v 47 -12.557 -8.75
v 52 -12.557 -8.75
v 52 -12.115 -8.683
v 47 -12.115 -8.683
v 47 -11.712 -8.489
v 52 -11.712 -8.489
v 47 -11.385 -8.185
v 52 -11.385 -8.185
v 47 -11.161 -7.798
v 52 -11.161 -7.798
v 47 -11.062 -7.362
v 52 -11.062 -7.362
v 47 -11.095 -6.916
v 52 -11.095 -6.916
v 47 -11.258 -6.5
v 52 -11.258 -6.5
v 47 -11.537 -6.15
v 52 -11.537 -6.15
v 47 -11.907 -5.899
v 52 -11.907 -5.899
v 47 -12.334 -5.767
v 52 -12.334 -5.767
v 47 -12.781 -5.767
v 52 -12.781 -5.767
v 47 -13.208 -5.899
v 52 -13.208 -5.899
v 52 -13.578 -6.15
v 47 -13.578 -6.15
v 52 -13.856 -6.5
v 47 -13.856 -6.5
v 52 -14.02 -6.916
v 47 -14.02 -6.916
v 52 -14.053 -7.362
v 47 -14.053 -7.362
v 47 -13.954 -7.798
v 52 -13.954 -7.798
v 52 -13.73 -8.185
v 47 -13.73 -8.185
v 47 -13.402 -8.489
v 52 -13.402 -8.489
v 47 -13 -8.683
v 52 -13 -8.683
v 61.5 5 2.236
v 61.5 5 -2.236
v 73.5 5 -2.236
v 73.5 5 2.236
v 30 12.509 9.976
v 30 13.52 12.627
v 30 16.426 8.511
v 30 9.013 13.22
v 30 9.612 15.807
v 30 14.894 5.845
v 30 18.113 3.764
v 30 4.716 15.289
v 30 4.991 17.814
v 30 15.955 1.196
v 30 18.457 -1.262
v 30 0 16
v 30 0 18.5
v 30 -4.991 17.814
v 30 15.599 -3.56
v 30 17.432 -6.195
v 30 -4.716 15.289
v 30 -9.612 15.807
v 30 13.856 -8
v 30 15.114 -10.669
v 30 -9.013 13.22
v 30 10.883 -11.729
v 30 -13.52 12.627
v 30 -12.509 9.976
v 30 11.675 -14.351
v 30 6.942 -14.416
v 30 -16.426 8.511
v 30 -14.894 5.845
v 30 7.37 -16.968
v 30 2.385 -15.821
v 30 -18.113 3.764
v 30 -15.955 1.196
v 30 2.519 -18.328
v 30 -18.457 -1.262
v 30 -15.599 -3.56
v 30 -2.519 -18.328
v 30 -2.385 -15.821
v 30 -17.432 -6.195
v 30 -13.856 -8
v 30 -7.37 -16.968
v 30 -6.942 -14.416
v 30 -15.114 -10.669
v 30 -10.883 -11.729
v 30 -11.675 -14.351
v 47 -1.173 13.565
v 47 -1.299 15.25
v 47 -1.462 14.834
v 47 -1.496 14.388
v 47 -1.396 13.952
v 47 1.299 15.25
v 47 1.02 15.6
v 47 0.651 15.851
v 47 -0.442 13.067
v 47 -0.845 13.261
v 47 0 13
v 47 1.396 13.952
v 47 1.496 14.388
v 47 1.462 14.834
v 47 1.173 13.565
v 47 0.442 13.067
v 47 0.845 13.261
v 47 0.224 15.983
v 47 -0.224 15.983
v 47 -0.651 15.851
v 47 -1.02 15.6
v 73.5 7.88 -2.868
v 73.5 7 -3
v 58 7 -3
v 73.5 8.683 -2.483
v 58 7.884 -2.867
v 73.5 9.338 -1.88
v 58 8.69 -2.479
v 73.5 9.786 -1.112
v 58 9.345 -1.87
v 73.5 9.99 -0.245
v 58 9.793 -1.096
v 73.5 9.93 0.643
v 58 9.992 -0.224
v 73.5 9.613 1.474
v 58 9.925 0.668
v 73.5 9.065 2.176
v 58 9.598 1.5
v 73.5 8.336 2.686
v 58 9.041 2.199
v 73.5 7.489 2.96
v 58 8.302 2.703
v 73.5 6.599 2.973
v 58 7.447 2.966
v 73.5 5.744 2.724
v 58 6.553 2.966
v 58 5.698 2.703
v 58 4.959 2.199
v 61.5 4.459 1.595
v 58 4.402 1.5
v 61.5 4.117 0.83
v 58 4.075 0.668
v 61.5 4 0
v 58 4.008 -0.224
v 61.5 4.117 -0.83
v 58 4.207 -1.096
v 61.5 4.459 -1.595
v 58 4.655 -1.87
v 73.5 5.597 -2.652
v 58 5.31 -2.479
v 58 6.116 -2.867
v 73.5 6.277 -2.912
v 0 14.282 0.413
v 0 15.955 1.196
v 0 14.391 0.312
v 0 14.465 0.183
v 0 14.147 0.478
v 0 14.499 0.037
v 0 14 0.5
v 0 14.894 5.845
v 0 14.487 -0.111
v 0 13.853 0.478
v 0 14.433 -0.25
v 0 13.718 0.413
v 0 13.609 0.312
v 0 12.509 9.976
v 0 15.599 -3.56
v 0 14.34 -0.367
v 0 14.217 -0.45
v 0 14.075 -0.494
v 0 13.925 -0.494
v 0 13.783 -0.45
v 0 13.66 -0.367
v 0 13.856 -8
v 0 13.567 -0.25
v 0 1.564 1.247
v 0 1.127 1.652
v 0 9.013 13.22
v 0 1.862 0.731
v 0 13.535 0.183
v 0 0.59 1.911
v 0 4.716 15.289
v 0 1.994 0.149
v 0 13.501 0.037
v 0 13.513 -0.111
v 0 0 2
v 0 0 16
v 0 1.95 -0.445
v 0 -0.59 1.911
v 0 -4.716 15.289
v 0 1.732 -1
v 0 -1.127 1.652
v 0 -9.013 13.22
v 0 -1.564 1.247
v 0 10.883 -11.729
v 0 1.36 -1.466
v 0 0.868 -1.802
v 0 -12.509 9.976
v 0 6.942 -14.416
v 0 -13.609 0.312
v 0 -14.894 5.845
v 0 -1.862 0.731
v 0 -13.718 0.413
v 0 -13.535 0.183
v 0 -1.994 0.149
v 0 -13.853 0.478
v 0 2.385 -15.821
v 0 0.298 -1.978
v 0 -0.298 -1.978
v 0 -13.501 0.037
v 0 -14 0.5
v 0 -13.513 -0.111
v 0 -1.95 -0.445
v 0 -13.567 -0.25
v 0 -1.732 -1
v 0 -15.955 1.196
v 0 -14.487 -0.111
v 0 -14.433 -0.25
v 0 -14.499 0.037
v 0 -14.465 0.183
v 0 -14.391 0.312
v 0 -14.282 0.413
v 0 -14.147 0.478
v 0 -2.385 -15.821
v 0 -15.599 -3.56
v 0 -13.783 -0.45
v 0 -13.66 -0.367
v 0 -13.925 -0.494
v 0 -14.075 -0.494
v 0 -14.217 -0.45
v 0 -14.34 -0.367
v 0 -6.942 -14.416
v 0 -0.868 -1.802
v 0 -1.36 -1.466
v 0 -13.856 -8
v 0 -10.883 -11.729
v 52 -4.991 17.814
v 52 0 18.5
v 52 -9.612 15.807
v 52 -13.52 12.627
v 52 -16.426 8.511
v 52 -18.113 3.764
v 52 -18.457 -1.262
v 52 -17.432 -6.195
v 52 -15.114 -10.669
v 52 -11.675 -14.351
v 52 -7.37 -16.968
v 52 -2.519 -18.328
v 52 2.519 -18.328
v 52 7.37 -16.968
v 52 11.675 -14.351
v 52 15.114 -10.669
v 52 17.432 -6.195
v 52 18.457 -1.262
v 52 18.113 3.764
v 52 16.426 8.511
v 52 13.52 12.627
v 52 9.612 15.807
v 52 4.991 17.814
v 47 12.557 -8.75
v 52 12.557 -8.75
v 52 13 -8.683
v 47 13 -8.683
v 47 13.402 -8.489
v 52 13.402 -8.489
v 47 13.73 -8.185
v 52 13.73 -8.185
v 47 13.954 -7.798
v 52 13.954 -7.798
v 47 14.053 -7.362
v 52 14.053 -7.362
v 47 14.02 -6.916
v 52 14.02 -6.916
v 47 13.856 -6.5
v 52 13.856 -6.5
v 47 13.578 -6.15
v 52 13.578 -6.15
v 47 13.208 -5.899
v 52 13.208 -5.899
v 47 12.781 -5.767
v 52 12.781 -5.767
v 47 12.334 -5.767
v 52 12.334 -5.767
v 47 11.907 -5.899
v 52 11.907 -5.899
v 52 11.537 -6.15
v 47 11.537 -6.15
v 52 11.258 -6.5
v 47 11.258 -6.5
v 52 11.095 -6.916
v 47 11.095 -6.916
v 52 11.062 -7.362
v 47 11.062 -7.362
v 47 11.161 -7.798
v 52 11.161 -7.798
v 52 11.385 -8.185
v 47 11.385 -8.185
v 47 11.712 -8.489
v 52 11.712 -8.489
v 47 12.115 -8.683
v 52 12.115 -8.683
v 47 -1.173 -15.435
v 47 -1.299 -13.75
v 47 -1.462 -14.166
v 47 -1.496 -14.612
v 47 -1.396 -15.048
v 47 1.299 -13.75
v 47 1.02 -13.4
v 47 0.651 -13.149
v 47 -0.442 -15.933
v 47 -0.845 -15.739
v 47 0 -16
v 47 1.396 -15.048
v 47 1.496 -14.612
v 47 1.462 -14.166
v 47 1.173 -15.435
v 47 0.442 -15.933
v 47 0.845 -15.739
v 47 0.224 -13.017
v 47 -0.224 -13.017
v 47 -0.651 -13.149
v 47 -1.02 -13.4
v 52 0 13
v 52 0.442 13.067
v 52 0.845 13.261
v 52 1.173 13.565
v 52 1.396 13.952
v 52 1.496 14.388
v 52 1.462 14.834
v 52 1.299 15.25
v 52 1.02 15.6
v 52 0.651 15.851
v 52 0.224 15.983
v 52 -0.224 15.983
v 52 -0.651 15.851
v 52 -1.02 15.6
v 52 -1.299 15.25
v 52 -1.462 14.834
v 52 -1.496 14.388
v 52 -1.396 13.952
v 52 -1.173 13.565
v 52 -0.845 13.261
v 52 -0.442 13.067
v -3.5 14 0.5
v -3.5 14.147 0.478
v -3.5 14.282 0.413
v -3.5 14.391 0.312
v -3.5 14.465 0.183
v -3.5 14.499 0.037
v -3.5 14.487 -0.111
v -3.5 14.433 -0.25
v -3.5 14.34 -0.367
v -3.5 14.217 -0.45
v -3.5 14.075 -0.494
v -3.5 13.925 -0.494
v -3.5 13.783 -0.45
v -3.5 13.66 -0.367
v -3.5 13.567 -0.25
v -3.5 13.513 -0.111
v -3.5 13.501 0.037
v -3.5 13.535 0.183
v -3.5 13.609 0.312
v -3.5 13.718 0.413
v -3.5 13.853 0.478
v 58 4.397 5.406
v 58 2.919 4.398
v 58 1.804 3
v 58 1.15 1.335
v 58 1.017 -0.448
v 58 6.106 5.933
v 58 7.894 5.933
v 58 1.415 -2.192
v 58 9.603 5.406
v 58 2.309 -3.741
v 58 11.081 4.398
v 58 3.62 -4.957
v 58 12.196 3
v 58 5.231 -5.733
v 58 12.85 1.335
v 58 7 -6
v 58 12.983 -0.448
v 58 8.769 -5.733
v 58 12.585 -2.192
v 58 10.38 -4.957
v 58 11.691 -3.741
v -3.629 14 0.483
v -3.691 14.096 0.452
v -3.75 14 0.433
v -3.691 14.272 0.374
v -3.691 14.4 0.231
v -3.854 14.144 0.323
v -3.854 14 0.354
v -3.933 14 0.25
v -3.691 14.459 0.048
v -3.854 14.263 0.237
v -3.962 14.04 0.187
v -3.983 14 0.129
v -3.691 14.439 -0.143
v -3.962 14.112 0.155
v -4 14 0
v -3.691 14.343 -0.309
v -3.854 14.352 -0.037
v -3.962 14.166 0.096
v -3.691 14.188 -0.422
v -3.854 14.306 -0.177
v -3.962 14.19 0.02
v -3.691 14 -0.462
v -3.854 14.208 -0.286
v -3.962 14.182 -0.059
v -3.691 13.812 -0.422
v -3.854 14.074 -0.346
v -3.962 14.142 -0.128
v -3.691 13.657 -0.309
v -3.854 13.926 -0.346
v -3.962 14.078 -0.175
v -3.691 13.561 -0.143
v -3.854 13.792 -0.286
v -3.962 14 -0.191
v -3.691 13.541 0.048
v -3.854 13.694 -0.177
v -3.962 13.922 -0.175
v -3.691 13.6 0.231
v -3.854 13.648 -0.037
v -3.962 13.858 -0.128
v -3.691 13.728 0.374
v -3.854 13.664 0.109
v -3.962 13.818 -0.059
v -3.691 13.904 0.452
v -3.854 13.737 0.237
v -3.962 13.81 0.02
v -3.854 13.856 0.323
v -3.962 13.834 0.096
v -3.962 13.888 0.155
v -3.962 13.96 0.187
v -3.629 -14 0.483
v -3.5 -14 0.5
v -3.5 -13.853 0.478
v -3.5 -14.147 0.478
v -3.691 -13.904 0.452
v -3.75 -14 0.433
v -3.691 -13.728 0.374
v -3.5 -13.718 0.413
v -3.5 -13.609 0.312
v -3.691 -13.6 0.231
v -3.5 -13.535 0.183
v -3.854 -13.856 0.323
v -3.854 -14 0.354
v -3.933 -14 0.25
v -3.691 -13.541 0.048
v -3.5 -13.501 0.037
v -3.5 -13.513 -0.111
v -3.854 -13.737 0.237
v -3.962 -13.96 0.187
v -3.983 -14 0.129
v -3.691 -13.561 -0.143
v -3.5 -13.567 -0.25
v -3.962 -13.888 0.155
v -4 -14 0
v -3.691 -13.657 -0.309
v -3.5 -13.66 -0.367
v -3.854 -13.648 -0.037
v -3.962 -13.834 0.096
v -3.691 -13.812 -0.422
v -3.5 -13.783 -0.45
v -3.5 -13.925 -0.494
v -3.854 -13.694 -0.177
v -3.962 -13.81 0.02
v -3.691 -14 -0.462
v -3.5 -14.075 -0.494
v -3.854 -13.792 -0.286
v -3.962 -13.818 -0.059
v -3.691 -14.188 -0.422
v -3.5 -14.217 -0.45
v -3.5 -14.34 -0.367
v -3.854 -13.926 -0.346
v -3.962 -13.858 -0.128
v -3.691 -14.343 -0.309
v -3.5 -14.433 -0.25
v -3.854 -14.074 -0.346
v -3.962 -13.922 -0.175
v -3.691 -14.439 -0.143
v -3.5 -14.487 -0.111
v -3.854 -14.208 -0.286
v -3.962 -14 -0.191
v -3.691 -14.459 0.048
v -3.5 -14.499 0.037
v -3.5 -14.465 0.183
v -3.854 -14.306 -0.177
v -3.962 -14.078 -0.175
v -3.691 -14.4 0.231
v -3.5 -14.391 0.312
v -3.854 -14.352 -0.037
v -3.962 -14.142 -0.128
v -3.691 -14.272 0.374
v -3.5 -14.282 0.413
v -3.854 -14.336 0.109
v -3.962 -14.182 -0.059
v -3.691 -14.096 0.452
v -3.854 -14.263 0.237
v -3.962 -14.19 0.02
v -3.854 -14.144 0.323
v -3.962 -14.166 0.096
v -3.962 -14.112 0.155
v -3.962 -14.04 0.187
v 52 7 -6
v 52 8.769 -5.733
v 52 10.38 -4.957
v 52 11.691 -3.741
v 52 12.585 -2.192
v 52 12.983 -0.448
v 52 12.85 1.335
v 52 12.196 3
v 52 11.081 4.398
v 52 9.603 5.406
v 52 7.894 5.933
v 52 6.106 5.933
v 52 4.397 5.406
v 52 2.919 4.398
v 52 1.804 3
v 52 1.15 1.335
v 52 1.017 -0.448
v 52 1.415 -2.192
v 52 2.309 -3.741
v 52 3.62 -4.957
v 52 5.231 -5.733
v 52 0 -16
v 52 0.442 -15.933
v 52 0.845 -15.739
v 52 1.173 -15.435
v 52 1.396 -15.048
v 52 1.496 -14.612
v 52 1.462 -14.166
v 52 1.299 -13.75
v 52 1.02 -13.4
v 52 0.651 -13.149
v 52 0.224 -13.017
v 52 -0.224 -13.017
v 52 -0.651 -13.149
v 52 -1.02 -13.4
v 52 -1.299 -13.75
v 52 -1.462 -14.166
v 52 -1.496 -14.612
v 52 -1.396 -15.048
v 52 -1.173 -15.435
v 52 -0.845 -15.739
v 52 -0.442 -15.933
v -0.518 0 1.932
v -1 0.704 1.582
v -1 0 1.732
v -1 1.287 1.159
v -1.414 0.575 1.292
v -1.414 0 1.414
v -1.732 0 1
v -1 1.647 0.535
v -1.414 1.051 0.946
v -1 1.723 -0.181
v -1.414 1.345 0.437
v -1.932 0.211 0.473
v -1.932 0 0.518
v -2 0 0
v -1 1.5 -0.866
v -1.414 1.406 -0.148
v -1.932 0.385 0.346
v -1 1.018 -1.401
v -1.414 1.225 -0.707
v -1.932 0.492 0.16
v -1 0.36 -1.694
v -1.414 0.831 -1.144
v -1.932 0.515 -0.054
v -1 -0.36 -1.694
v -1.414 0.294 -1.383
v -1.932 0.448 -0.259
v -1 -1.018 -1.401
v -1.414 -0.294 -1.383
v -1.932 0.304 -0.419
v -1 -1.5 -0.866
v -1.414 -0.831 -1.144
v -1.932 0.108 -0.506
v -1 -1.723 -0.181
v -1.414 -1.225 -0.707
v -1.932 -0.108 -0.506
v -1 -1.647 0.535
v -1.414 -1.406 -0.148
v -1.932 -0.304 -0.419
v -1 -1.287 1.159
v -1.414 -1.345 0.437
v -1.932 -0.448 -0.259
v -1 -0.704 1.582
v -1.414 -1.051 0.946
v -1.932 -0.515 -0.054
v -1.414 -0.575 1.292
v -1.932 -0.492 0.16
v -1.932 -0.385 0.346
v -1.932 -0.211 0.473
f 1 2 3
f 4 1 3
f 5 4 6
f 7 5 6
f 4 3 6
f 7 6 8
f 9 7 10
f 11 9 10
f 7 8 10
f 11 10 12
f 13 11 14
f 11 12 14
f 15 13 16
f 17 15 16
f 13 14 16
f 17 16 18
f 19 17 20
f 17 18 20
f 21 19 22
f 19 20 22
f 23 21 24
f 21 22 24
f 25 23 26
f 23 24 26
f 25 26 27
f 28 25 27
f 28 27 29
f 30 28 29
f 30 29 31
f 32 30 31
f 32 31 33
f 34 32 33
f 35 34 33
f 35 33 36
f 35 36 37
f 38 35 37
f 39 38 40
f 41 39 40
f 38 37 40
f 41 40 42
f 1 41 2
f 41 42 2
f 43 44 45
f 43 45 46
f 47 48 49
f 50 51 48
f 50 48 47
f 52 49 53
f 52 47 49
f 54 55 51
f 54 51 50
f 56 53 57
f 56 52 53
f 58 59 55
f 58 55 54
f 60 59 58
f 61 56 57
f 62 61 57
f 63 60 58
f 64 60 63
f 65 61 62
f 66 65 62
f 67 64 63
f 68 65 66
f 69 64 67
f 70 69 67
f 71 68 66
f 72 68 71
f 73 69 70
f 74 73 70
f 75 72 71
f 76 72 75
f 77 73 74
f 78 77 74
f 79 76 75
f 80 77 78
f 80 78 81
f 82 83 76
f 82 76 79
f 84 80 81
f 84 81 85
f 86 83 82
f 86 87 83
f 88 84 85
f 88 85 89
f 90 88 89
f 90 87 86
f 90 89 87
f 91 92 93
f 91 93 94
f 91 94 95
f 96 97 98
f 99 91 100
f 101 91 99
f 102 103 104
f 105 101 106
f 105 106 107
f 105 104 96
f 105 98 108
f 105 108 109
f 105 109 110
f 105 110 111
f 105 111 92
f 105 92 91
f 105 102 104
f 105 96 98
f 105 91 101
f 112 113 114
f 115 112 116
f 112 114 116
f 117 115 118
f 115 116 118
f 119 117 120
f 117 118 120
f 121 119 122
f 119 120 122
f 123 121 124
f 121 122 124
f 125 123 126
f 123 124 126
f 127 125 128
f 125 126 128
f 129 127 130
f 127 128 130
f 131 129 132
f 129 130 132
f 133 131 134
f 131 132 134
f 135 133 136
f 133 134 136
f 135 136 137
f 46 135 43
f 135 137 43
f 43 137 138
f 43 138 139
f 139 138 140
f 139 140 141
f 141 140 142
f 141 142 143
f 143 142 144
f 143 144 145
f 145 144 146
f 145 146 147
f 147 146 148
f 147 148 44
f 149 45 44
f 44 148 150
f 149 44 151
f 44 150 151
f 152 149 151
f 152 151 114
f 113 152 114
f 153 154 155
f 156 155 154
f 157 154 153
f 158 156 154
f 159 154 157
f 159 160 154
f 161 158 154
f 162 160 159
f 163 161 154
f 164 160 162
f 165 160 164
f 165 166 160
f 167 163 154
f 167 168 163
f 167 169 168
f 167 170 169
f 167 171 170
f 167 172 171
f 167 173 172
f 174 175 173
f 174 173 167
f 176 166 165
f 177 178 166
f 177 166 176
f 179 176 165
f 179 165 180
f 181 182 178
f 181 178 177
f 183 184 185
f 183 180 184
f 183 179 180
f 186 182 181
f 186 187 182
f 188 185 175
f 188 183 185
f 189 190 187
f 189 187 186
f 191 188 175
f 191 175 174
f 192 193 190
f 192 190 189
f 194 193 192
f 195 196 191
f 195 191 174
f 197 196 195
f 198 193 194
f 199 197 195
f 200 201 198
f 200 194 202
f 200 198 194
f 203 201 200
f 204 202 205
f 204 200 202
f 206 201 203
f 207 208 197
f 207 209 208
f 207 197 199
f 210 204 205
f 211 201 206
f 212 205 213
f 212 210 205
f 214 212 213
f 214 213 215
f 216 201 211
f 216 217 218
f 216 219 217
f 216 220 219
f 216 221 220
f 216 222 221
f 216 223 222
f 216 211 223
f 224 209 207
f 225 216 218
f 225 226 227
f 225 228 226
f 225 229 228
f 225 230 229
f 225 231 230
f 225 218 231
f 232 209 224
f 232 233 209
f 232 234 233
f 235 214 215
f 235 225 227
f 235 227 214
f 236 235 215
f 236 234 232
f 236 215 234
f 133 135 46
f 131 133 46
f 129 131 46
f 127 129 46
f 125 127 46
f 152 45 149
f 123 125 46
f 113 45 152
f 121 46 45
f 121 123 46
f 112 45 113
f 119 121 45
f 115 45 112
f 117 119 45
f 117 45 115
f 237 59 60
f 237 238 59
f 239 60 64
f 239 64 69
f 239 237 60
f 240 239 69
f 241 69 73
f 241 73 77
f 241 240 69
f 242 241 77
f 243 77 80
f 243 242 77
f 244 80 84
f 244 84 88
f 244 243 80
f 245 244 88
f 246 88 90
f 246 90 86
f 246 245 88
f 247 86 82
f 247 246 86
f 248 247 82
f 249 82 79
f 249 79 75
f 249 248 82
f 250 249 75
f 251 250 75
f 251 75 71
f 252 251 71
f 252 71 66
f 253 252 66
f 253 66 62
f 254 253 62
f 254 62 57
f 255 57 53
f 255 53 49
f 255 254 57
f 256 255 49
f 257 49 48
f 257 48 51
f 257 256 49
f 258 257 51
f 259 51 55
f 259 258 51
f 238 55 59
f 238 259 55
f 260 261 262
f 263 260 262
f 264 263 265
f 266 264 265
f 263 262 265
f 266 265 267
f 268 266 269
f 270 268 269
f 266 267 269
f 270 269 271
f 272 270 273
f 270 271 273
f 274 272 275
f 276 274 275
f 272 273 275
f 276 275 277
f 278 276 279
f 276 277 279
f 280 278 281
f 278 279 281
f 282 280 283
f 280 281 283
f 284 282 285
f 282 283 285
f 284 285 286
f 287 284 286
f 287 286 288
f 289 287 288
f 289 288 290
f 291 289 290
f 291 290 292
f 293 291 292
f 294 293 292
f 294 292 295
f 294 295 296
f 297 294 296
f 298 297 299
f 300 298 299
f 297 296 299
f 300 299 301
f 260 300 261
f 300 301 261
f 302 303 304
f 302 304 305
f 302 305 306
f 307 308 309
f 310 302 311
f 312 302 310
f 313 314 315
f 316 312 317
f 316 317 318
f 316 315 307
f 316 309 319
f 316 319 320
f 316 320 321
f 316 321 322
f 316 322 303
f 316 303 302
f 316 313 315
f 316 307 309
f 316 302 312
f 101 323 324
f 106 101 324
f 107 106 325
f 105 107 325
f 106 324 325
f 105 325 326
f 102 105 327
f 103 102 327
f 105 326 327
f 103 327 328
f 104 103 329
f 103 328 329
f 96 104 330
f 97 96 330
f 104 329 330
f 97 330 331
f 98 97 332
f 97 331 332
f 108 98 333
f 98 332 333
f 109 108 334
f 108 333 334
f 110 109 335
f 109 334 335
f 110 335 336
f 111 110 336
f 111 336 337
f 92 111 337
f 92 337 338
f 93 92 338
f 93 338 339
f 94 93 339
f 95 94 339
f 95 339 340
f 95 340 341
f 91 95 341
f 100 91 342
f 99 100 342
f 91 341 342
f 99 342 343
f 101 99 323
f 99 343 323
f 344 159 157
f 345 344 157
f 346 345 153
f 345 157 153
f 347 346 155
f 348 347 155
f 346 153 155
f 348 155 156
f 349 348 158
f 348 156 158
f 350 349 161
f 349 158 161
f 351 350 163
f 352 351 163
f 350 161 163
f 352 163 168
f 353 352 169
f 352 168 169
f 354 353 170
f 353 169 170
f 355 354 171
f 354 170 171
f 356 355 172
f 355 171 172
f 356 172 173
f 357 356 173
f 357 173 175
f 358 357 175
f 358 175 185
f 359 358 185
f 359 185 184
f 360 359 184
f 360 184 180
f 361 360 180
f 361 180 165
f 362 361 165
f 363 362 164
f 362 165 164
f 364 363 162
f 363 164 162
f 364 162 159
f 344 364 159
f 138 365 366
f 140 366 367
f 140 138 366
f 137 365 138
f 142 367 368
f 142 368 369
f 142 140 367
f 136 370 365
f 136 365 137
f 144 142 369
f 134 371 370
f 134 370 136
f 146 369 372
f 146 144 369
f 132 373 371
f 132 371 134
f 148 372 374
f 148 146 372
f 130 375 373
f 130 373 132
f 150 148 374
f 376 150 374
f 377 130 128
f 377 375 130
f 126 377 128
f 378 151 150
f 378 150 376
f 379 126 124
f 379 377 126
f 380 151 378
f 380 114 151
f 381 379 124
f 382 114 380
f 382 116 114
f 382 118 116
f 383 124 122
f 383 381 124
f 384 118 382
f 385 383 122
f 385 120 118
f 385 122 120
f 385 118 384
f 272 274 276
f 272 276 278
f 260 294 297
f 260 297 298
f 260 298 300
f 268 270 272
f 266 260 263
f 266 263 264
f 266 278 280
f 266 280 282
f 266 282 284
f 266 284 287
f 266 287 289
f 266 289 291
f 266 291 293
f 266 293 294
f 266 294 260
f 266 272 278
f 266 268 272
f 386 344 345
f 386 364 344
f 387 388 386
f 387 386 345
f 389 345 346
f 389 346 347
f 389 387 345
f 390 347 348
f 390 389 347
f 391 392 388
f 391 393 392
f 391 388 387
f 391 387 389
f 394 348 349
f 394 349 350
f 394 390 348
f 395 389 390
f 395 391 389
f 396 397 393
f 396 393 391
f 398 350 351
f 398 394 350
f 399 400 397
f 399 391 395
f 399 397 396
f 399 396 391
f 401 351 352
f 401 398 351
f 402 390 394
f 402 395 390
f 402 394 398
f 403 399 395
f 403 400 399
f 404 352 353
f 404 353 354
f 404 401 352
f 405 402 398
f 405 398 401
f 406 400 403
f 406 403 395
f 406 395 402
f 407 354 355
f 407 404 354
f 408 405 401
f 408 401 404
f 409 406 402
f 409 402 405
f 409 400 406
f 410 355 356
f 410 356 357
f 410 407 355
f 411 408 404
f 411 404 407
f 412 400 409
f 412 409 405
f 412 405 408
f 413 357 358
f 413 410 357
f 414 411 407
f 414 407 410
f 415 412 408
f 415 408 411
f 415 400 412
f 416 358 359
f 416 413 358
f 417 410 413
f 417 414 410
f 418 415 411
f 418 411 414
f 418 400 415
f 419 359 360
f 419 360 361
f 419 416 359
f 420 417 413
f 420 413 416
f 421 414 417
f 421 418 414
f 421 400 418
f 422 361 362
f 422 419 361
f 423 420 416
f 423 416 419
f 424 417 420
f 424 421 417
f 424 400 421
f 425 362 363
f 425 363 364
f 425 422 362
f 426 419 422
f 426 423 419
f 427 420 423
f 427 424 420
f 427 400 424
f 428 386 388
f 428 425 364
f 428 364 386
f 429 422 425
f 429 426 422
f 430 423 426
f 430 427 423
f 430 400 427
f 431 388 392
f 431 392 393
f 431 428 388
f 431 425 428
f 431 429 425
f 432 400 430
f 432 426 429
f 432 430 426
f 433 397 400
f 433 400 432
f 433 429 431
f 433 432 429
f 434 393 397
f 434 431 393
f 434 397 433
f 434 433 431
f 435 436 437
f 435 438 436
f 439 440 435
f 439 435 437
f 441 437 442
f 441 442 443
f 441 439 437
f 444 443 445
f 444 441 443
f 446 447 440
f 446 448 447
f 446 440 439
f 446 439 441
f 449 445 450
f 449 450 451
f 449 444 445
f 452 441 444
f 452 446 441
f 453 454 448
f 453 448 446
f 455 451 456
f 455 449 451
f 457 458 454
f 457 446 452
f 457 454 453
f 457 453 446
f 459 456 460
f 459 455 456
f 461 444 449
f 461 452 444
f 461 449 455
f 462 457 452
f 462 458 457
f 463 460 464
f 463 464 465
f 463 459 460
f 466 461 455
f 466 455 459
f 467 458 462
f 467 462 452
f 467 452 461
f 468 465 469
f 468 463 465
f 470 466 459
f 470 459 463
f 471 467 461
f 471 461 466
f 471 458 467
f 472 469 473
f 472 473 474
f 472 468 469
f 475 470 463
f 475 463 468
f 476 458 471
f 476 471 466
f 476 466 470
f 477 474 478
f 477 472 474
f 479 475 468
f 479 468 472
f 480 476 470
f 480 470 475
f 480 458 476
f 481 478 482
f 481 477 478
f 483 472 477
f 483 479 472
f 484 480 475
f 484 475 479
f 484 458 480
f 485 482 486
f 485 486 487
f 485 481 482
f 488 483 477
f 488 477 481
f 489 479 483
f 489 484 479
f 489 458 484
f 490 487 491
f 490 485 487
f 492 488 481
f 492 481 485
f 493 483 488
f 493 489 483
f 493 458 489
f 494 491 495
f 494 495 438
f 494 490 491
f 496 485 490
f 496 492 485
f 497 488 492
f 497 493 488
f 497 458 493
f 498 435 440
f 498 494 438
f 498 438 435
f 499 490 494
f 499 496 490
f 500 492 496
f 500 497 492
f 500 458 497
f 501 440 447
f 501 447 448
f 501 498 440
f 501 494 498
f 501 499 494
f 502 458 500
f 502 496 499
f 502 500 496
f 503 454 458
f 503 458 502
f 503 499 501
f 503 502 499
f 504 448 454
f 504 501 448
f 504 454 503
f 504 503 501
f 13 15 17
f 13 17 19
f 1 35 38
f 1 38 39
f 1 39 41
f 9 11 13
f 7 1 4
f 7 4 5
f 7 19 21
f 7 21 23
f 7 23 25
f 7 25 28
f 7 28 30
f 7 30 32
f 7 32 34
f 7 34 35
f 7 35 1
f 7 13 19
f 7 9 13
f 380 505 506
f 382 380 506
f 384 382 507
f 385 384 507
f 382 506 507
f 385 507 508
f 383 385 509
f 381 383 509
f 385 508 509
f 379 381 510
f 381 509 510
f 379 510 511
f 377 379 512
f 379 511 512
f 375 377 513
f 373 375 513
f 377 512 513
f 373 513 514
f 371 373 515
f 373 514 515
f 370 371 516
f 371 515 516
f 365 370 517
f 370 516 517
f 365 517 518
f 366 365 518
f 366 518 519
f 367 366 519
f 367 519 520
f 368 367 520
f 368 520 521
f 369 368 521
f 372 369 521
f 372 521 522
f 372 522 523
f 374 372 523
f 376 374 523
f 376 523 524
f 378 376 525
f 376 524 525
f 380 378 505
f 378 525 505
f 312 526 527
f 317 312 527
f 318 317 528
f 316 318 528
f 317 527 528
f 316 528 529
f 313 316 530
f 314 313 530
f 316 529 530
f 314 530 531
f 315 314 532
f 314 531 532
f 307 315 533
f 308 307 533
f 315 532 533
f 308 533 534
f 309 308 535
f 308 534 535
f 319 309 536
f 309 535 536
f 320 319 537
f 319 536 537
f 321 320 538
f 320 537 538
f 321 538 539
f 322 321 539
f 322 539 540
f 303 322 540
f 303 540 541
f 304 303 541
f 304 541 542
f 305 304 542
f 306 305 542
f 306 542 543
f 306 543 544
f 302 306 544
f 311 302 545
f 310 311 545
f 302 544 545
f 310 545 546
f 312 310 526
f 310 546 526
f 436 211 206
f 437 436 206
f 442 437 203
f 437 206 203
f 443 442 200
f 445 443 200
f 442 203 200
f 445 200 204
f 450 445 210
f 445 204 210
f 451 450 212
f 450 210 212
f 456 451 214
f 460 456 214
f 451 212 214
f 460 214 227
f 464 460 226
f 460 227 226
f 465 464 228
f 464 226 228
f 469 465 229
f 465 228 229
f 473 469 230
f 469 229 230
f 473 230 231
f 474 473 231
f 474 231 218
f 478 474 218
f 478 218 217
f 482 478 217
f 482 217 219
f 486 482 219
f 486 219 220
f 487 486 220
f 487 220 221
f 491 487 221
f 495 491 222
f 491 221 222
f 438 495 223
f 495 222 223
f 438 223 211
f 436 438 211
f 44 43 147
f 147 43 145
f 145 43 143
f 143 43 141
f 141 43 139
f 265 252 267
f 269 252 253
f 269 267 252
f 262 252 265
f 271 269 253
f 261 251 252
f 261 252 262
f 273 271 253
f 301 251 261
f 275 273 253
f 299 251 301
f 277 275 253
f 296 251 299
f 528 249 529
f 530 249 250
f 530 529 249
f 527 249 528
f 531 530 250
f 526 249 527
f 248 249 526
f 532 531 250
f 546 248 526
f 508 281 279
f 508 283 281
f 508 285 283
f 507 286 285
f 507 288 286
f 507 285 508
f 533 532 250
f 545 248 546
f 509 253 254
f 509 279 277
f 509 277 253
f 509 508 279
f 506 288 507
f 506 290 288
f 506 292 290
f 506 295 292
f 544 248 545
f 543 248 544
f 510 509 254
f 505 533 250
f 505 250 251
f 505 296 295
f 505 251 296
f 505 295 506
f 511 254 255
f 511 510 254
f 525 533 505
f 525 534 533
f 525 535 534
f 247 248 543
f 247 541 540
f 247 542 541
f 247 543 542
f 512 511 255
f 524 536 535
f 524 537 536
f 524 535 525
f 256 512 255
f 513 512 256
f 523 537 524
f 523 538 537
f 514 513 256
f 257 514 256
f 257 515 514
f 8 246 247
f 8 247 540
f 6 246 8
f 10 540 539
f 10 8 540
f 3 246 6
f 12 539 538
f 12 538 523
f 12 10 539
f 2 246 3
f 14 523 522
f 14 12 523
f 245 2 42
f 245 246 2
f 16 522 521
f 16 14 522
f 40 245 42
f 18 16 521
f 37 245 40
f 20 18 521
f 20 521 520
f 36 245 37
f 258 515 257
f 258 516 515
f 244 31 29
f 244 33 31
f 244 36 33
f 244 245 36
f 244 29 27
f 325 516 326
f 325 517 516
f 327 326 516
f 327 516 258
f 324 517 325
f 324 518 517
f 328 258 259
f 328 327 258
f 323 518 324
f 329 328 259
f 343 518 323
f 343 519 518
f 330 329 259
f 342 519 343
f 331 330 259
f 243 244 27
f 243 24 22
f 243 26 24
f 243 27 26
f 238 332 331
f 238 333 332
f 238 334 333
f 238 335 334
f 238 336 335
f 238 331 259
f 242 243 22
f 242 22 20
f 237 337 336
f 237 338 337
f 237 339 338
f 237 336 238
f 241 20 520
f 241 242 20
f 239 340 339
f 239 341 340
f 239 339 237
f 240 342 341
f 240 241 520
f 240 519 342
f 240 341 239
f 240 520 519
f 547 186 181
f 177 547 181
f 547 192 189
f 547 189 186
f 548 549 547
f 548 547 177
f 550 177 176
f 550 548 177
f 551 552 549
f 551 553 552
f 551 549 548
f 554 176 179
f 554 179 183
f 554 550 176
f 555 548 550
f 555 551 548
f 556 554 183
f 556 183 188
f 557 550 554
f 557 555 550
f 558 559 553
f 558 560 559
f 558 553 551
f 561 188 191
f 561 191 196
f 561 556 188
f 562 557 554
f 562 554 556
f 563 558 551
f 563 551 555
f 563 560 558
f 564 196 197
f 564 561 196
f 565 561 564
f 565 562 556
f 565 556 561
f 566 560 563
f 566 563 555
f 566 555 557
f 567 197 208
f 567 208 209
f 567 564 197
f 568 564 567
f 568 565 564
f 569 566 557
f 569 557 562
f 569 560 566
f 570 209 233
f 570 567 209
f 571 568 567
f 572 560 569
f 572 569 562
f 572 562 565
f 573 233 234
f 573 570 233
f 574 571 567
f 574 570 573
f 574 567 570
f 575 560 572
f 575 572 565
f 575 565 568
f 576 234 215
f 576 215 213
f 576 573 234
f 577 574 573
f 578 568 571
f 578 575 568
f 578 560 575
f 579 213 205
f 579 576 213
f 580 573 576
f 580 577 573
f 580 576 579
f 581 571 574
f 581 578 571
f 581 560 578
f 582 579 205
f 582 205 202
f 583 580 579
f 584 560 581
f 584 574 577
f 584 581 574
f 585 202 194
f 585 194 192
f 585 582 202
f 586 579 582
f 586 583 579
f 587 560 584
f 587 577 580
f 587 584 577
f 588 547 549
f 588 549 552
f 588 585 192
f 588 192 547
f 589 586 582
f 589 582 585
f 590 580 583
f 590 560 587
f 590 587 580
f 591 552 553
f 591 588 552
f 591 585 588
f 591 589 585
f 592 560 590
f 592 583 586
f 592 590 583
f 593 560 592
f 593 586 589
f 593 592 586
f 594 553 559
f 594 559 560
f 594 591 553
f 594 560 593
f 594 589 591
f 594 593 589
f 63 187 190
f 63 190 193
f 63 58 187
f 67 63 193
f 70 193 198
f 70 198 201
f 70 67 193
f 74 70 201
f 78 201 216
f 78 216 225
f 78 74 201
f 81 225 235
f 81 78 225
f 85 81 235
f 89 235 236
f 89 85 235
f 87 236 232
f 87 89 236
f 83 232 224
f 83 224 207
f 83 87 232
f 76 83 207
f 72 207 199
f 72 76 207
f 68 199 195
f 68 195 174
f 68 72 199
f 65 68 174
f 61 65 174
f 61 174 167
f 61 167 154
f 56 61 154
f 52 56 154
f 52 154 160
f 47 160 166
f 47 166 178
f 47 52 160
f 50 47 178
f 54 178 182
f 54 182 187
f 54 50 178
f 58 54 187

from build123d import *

# Parameters (mm, degrees)
SKETCH2_R           = 2
BOSS_EXTRUDE1_DEPTH = 2
FILLET3_R           = 2
SKETCH3_R           = 6
BOSS_EXTRUDE2_DEPTH = 6
SKETCH4_R           = 3
BOSS_EXTRUDE3_DEPTH = 15.5
CUT_EXTRUDE1_START  = -12
CUT_EXTRUDE1_DEPTH  = 12
SKETCH6_R           = 1.5
CUT_EXTRUDE2_DEPTH  = 5
SKETCH7_R           = 1.5
CUT_EXTRUDE3_DEPTH  = 5
SKETCH9_R           = 0.5
BOSS_EXTRUDE4_DEPTH = 4
FILLET4_R           = 0.5


with BuildPart() as part:
    # Sketch1 → Revolve1 (revolve)
    with BuildSketch(Plane(origin=(0, 0, 0), x_dir=(1, 0, 0), z_dir=(0, 1, 0)), mode=Mode.PRIVATE) as revolve1_sk:
        Polygon((52, 18.5), (52, 0), (0, 0), (0, 16), (30, 16), (30, 18.5), align=None)
    revolve(revolve1_sk.sketch.rotate(Axis((0, 0, 0), (1, 0, 0)), 180), axis=Axis((0, 0, 0), (1, 0, 0)))

    # Sketch2 → Boss-Extrude1 (add)
    with BuildSketch(Plane.ZY):
        Circle(SKETCH2_R)
    extrude(amount=BOSS_EXTRUDE1_DEPTH)

    # Fillet3
    fillet3_edges = [part.edges().sort_by_distance(p)[0] for p in [
        (-2, 0, -2),
    ]]
    fillet(fillet3_edges, radius=FILLET3_R - 0.0001)  # a hair under: the kernel refuses the full size

    # Sketch3 → Boss-Extrude2 (add)
    with BuildSketch(Plane(origin=(52, 0, 0), x_dir=(0, 0, -1), z_dir=(1, 0, 0))):
        with Locations((0, 7)):
            Circle(SKETCH3_R)
    extrude(amount=BOSS_EXTRUDE2_DEPTH)

    # Sketch4 → Boss-Extrude3 (add)
    with BuildSketch(Plane(origin=(58, 0, 0), x_dir=(0, 0, -1), z_dir=(1, 0, 0))):
        with Locations((0, 7)):
            Circle(SKETCH4_R)
    extrude(amount=BOSS_EXTRUDE3_DEPTH)

    # Sketch5 → Cut-Extrude1 (cut)
    with BuildSketch(Plane(origin=(73.5, 0, 0), x_dir=(0, 0, -1), z_dir=(1, 0, 0)).offset(CUT_EXTRUDE1_START)):
        with BuildLine():
            ThreePointArc((-2.236067977, 5), (-1.224744871, 4.261387212), (0, 4))
            Line((0, 4), (0, 5))
            Line((0, 5), (-2.236067977, 5))
        make_face()
        with BuildLine():
            Line((0, 5), (0, 4))
            ThreePointArc((0, 4), (1.224744871, 4.261387212), (2.236067977, 5))
            Line((2.236067977, 5), (0, 5))
        make_face()
    extrude(amount=CUT_EXTRUDE1_DEPTH, mode=Mode.SUBTRACT)

    # Sketch6 → Cut-Extrude2 (cut)
    with BuildSketch(Plane(origin=(52, 0, 0), x_dir=(0, 0, -1), z_dir=(1, 0, 0))):
        with Locations((-14.5, 0)):
            Circle(SKETCH6_R)
        with Locations((7.25, 12.557368355)):
            Circle(SKETCH6_R)
        with Locations((7.25, -12.557368355)):
            Circle(SKETCH6_R)
    extrude(amount=-CUT_EXTRUDE2_DEPTH, mode=Mode.SUBTRACT)

    # Sketch7 → Cut-Extrude3 (cut)
    with BuildSketch(Plane(origin=(52, 0, 0), x_dir=(0, 0, -1), z_dir=(1, 0, 0))):
        with Locations((14.5, 0)):
            Circle(SKETCH7_R)
    extrude(amount=-CUT_EXTRUDE3_DEPTH, mode=Mode.SUBTRACT)

    # Sketch9 → Boss-Extrude4 (add)
    with BuildSketch(Plane.ZY):
        with Locations((0, 14)):
            Circle(SKETCH9_R)
        with Locations((0, -14)):
            Circle(SKETCH9_R)
    extrude(amount=BOSS_EXTRUDE4_DEPTH)

    # Fillet4
    fillet4_edges = [part.edges().sort_by_distance(p)[0] for p in [
        (-4, 14, -0.5),
        (-4, -14, -0.5),
    ]]
    fillet(fillet4_edges, radius=FILLET4_R)


solid = part.part
